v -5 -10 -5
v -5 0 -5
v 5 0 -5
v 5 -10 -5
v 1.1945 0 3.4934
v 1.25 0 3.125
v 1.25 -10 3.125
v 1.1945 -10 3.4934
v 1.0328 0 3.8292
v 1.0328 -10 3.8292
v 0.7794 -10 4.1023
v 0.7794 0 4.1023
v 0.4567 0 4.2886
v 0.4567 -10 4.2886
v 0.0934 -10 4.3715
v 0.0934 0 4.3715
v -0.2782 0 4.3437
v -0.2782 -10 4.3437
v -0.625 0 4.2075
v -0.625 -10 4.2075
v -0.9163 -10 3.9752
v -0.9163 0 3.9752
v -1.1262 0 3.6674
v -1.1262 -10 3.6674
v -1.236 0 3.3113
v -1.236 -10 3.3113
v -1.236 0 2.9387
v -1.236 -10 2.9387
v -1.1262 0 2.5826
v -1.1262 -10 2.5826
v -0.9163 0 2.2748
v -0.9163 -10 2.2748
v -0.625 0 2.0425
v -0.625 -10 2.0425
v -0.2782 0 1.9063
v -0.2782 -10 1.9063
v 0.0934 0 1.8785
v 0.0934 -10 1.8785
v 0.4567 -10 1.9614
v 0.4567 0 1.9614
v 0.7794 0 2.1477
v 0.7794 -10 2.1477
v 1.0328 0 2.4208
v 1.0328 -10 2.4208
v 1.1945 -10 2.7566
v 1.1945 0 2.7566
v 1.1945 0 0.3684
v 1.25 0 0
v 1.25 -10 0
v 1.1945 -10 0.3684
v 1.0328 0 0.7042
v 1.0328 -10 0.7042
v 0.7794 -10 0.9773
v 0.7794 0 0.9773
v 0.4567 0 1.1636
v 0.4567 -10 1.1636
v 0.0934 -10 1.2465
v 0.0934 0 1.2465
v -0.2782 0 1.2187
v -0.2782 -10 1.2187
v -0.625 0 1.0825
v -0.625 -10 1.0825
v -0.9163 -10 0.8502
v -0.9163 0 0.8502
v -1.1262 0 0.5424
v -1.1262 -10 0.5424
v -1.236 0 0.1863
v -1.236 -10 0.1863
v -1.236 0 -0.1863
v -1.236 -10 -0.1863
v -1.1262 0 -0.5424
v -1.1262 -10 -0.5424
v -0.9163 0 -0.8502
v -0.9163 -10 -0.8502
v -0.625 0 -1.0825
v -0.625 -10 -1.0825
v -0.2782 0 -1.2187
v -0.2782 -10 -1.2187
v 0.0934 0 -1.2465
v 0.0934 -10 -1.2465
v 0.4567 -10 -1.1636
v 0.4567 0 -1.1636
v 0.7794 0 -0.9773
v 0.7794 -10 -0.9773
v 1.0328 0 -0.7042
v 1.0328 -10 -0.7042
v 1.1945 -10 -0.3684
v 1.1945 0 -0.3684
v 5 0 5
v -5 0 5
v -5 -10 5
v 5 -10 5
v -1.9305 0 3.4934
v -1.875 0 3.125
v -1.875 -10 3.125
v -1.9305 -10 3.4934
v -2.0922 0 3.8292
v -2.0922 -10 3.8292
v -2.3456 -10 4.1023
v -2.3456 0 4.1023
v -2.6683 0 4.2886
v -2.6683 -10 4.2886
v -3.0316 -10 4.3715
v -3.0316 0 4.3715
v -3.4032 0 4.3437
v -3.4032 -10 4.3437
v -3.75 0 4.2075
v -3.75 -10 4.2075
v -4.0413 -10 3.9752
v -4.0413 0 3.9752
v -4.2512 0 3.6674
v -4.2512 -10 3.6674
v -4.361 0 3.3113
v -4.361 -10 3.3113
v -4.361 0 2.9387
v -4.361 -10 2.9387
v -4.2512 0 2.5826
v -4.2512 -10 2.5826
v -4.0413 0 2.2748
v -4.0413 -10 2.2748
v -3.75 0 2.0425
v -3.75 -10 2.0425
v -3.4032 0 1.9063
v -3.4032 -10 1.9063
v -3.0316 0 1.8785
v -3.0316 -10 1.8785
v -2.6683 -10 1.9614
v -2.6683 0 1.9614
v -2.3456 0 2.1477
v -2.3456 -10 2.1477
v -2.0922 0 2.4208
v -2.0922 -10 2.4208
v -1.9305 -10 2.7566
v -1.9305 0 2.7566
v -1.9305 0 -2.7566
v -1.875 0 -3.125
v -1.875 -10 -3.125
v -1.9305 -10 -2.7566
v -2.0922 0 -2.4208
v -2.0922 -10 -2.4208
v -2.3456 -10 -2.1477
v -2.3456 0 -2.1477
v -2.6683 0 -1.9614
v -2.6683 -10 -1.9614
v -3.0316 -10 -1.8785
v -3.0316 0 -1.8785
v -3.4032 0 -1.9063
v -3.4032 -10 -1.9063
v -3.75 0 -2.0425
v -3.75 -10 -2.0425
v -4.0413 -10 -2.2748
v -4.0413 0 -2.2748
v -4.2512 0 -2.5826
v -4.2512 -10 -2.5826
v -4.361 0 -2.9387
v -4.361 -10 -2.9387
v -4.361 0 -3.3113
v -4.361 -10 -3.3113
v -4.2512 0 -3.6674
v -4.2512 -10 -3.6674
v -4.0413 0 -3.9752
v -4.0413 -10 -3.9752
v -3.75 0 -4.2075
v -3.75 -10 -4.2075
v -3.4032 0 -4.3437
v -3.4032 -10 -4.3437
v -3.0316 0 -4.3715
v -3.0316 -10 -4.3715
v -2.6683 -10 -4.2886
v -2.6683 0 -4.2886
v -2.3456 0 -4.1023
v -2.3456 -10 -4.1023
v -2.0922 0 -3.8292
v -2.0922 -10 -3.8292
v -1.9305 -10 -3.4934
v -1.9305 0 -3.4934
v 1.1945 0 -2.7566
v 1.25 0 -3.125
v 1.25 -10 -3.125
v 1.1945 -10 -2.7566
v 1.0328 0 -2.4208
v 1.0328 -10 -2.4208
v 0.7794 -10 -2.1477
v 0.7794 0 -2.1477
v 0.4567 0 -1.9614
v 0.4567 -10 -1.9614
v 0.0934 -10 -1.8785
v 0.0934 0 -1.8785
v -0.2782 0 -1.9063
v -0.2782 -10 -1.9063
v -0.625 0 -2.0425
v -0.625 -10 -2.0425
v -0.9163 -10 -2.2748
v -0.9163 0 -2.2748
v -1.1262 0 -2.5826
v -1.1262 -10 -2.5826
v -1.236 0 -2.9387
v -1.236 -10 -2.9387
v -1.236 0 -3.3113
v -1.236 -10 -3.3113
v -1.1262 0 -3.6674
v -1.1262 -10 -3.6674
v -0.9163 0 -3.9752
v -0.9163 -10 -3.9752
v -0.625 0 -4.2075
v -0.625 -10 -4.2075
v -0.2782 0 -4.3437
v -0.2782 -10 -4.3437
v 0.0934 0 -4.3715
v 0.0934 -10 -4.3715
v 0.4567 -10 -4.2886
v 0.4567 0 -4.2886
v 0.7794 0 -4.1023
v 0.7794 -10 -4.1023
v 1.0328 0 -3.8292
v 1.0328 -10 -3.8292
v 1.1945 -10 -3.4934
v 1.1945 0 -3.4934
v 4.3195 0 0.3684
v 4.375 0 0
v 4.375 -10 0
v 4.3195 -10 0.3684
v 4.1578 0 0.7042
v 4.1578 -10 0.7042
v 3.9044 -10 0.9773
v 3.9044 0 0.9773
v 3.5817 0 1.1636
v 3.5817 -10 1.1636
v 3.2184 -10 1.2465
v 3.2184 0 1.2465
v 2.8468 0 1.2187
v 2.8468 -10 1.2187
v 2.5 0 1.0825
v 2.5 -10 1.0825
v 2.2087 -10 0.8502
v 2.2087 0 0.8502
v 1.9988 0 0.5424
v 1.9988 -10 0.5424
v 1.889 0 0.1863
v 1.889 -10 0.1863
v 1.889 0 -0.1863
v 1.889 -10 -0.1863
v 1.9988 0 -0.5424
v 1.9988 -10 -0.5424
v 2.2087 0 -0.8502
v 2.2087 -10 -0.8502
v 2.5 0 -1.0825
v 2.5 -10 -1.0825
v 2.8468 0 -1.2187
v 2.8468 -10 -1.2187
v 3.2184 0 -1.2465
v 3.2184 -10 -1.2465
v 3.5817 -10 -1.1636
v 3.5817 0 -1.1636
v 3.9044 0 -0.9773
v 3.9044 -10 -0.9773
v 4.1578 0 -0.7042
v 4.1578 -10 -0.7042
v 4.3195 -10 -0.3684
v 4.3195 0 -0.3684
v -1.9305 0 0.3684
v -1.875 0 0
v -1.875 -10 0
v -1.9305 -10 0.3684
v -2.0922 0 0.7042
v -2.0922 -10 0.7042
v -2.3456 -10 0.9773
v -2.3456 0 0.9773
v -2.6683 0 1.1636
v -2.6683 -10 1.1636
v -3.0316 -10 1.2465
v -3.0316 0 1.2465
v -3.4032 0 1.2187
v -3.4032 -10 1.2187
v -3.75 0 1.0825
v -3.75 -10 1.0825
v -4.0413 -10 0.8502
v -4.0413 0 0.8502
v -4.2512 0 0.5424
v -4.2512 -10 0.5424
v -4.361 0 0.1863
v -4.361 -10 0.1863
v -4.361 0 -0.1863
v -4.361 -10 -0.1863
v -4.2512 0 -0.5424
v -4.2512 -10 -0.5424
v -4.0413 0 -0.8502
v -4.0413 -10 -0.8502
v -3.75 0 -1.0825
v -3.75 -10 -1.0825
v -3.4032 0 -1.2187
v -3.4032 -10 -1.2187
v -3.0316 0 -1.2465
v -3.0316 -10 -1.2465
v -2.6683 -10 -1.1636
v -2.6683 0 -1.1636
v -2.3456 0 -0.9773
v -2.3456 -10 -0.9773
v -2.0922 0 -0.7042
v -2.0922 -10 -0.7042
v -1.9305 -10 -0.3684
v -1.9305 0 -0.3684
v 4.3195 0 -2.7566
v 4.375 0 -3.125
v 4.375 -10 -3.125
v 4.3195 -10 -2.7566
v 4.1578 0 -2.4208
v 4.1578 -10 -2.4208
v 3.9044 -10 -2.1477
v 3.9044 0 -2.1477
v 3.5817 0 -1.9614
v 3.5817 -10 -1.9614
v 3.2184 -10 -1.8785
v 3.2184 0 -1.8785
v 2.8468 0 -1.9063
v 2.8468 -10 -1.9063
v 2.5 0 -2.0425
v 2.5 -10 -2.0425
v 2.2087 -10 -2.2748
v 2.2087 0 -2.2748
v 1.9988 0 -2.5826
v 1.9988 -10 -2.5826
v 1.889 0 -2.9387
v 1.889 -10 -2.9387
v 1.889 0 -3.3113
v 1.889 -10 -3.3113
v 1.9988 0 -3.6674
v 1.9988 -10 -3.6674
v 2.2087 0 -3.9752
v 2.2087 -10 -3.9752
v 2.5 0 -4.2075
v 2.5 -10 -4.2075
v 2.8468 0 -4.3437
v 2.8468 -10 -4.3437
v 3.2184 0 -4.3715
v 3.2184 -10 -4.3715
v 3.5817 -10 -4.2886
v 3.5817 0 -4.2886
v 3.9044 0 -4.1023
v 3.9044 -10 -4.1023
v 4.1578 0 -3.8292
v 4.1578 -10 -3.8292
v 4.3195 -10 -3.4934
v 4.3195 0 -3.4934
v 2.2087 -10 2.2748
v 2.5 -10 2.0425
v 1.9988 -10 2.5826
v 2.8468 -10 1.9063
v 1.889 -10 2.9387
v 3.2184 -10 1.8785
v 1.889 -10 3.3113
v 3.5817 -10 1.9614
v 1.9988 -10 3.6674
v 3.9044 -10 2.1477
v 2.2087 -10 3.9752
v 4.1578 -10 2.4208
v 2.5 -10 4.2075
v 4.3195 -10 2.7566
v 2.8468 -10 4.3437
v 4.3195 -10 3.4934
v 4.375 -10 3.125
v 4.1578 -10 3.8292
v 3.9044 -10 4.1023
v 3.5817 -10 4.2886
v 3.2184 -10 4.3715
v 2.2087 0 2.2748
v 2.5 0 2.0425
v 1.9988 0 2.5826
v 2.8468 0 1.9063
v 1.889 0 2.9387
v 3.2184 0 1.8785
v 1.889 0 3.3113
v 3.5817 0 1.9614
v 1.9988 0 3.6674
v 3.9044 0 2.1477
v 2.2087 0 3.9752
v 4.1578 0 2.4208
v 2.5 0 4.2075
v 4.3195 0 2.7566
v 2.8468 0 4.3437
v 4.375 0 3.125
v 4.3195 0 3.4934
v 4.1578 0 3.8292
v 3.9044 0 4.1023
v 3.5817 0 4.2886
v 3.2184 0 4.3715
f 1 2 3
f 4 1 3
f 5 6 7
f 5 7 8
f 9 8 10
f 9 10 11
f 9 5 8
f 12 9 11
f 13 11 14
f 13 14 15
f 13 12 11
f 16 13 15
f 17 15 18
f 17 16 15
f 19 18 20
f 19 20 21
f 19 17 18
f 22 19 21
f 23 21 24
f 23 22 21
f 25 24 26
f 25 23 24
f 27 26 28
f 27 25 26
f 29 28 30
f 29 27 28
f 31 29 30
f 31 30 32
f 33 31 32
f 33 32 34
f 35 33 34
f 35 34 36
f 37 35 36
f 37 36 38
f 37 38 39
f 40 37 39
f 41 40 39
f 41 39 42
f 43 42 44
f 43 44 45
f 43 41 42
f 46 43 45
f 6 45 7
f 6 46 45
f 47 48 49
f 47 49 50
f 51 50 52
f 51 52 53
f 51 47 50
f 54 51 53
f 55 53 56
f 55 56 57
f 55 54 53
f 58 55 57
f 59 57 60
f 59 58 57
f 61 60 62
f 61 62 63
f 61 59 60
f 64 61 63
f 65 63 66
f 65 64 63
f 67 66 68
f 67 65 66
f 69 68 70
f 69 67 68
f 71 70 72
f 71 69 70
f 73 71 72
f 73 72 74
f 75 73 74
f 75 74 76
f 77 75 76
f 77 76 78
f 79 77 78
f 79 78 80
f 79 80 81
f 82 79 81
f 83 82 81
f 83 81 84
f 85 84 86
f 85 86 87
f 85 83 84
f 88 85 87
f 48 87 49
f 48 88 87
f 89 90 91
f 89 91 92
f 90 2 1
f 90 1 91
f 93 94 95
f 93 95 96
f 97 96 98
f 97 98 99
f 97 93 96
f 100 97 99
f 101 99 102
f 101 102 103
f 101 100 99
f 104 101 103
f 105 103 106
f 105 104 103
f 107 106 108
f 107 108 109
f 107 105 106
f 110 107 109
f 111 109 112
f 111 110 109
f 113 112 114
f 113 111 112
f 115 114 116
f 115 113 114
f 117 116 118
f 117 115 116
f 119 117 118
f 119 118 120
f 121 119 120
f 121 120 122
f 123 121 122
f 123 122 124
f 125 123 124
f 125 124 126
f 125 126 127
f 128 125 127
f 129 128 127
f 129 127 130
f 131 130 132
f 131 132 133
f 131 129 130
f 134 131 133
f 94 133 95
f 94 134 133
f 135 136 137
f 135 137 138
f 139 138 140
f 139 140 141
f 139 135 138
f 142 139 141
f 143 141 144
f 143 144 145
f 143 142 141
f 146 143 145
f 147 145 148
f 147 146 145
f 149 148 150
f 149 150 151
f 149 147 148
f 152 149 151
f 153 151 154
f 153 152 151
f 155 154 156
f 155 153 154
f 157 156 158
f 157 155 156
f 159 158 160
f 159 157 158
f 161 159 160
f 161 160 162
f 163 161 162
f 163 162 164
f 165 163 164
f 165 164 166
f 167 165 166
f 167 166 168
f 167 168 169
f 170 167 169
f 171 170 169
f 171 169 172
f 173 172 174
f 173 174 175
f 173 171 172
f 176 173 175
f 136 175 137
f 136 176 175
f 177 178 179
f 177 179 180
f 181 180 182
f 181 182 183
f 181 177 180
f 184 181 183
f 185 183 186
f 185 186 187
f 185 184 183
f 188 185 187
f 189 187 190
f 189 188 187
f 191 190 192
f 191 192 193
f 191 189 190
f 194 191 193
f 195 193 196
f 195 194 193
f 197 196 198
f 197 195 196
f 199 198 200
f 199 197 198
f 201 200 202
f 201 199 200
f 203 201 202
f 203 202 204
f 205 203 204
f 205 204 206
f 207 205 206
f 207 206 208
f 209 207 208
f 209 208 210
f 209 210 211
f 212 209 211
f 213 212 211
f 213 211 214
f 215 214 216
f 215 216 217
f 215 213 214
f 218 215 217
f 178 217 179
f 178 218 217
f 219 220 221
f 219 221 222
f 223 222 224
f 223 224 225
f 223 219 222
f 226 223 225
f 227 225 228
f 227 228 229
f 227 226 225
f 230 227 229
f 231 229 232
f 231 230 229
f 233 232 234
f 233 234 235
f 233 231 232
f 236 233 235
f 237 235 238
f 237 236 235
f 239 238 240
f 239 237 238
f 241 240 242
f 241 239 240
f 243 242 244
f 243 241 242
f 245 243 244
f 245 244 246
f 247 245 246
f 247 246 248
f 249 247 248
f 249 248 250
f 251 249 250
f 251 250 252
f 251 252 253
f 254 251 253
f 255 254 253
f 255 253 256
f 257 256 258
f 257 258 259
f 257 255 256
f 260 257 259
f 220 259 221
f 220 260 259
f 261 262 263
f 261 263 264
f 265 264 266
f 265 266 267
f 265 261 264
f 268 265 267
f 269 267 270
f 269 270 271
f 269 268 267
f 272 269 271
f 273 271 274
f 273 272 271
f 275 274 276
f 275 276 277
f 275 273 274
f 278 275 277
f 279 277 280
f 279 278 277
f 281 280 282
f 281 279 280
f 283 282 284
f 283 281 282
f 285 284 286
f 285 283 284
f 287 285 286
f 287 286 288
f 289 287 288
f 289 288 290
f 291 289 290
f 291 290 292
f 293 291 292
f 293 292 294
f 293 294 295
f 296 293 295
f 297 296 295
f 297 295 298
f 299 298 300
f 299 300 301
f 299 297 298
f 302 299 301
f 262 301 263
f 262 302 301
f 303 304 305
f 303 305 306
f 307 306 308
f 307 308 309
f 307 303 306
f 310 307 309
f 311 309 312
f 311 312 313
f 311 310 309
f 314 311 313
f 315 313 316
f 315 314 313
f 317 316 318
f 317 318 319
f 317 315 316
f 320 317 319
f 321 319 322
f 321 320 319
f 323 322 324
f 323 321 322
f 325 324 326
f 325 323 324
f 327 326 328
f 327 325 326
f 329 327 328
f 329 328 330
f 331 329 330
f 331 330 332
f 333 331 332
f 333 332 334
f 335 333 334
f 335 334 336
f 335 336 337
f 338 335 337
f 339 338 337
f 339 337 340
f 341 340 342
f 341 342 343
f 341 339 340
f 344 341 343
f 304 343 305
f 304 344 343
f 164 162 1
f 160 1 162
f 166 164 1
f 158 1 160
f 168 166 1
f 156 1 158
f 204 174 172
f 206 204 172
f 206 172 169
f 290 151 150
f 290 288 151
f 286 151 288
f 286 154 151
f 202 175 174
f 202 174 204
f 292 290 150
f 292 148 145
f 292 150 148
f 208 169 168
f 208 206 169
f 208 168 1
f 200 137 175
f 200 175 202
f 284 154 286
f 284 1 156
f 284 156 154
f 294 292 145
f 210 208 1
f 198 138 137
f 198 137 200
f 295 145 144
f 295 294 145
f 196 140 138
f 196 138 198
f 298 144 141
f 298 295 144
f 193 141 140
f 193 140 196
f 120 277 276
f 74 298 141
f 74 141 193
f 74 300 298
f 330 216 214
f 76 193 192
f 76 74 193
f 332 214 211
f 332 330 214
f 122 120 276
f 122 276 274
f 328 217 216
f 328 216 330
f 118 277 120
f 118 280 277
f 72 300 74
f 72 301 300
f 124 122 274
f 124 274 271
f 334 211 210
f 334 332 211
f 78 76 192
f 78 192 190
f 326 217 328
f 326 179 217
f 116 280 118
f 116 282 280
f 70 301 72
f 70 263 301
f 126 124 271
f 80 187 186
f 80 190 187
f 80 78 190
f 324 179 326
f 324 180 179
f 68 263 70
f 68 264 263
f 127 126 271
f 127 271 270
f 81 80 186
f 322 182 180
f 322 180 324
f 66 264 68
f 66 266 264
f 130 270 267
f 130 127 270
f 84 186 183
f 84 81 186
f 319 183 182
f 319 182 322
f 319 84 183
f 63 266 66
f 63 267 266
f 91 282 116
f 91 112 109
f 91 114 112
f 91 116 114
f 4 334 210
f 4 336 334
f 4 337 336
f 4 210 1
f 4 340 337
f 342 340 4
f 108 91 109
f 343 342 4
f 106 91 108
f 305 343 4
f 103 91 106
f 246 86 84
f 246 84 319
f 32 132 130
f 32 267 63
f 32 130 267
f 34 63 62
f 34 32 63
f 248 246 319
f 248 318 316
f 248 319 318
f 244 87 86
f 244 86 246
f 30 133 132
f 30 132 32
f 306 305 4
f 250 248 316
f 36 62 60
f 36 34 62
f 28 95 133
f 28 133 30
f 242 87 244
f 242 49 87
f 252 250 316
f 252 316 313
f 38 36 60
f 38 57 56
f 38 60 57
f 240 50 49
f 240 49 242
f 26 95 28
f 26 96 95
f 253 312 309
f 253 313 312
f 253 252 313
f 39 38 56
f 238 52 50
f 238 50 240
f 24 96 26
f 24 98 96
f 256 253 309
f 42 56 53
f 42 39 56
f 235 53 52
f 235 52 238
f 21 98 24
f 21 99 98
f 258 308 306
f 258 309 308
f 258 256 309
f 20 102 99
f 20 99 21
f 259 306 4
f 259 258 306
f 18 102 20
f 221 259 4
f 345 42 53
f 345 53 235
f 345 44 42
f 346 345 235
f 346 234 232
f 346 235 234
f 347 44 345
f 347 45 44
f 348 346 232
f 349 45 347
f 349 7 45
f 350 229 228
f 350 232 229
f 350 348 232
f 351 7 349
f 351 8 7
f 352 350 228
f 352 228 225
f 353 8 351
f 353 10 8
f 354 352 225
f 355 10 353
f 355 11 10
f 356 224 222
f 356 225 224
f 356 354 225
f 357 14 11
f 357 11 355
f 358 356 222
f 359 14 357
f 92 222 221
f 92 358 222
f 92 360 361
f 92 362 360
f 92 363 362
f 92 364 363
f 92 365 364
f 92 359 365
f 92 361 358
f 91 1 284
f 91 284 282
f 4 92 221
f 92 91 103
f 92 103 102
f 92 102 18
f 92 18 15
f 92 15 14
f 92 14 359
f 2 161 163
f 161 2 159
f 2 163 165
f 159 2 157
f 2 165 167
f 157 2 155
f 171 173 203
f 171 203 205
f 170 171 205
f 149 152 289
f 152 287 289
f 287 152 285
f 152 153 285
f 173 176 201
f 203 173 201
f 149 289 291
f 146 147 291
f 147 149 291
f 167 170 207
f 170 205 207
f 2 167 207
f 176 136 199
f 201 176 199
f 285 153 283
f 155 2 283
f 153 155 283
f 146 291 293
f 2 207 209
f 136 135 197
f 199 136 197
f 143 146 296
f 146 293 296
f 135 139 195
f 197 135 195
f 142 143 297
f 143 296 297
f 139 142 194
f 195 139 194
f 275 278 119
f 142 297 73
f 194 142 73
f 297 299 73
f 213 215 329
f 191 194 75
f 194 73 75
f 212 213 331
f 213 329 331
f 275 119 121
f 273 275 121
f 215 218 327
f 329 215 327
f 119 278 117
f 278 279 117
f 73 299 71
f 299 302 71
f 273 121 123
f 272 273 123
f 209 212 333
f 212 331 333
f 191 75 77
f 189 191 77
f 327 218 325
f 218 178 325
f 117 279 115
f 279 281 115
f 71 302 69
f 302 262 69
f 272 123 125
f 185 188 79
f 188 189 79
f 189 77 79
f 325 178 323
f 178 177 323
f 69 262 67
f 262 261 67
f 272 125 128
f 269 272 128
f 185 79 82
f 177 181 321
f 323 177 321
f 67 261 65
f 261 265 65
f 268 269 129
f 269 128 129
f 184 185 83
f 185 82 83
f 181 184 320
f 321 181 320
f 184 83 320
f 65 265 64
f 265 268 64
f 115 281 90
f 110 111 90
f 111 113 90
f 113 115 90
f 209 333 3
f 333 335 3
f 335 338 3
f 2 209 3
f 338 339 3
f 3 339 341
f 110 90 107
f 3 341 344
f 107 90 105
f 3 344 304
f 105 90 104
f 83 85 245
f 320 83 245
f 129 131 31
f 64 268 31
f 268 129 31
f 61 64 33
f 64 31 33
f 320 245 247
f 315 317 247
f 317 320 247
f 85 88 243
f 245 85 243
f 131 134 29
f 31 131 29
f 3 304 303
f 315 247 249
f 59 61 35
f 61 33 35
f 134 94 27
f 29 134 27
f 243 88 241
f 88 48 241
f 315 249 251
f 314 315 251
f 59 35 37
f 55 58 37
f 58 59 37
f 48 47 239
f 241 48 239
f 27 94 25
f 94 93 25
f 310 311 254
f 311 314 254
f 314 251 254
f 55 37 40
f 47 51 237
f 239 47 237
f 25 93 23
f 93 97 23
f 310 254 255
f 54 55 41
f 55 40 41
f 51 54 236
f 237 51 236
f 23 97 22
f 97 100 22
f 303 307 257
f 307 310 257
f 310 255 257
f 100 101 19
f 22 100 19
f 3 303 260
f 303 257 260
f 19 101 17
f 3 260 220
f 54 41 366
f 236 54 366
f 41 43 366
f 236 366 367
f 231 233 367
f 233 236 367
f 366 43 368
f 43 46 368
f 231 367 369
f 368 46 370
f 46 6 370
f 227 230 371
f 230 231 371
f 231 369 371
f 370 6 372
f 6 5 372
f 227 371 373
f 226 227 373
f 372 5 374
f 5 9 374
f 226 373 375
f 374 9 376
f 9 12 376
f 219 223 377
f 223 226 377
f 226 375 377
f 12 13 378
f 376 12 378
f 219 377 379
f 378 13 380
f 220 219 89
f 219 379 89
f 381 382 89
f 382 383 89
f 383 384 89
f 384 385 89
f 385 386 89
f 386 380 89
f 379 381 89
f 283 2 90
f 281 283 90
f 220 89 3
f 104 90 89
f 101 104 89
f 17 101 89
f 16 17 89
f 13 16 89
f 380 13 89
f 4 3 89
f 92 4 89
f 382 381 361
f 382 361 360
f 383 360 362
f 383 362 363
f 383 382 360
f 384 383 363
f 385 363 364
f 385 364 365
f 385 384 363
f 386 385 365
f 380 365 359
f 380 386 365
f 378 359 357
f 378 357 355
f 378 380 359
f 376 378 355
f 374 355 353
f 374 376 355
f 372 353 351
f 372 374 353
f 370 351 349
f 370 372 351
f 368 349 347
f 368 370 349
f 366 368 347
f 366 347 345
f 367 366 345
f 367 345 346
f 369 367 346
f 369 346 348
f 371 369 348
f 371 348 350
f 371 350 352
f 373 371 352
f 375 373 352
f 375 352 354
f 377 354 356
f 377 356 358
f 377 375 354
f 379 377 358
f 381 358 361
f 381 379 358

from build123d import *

# Parameters (mm, degrees)
F0_W     = 10
F0_H     = 10
F0_R     = 1.25
F1_DEPTH = 10


with BuildPart() as f1:
    # F0 (on Front) → F1 (new body)
    with BuildSketch(Plane.XZ):
        Rectangle(F0_W, F0_H)
        with Locations((-3.125, -3.125)):
            Circle(F0_R, mode=Mode.SUBTRACT)
        with Locations((0, -3.125)):
            Circle(F0_R, mode=Mode.SUBTRACT)
        with Locations((3.125, -3.125)):
            Circle(F0_R, mode=Mode.SUBTRACT)
        with Locations((-3.125, 0)):
            Circle(F0_R, mode=Mode.SUBTRACT)
        with Locations((-3.125, 3.125)):
            Circle(F0_R, mode=Mode.SUBTRACT)
        Circle(F0_R, mode=Mode.SUBTRACT)
        with Locations((3.125, 0)):
            Circle(F0_R, mode=Mode.SUBTRACT)
        with Locations((0, 3.125)):
            Circle(F0_R, mode=Mode.SUBTRACT)
        with Locations((3.125, 3.125)):
            Circle(F0_R, mode=Mode.SUBTRACT)
    extrude(amount=F1_DEPTH)


solid = f1.part
